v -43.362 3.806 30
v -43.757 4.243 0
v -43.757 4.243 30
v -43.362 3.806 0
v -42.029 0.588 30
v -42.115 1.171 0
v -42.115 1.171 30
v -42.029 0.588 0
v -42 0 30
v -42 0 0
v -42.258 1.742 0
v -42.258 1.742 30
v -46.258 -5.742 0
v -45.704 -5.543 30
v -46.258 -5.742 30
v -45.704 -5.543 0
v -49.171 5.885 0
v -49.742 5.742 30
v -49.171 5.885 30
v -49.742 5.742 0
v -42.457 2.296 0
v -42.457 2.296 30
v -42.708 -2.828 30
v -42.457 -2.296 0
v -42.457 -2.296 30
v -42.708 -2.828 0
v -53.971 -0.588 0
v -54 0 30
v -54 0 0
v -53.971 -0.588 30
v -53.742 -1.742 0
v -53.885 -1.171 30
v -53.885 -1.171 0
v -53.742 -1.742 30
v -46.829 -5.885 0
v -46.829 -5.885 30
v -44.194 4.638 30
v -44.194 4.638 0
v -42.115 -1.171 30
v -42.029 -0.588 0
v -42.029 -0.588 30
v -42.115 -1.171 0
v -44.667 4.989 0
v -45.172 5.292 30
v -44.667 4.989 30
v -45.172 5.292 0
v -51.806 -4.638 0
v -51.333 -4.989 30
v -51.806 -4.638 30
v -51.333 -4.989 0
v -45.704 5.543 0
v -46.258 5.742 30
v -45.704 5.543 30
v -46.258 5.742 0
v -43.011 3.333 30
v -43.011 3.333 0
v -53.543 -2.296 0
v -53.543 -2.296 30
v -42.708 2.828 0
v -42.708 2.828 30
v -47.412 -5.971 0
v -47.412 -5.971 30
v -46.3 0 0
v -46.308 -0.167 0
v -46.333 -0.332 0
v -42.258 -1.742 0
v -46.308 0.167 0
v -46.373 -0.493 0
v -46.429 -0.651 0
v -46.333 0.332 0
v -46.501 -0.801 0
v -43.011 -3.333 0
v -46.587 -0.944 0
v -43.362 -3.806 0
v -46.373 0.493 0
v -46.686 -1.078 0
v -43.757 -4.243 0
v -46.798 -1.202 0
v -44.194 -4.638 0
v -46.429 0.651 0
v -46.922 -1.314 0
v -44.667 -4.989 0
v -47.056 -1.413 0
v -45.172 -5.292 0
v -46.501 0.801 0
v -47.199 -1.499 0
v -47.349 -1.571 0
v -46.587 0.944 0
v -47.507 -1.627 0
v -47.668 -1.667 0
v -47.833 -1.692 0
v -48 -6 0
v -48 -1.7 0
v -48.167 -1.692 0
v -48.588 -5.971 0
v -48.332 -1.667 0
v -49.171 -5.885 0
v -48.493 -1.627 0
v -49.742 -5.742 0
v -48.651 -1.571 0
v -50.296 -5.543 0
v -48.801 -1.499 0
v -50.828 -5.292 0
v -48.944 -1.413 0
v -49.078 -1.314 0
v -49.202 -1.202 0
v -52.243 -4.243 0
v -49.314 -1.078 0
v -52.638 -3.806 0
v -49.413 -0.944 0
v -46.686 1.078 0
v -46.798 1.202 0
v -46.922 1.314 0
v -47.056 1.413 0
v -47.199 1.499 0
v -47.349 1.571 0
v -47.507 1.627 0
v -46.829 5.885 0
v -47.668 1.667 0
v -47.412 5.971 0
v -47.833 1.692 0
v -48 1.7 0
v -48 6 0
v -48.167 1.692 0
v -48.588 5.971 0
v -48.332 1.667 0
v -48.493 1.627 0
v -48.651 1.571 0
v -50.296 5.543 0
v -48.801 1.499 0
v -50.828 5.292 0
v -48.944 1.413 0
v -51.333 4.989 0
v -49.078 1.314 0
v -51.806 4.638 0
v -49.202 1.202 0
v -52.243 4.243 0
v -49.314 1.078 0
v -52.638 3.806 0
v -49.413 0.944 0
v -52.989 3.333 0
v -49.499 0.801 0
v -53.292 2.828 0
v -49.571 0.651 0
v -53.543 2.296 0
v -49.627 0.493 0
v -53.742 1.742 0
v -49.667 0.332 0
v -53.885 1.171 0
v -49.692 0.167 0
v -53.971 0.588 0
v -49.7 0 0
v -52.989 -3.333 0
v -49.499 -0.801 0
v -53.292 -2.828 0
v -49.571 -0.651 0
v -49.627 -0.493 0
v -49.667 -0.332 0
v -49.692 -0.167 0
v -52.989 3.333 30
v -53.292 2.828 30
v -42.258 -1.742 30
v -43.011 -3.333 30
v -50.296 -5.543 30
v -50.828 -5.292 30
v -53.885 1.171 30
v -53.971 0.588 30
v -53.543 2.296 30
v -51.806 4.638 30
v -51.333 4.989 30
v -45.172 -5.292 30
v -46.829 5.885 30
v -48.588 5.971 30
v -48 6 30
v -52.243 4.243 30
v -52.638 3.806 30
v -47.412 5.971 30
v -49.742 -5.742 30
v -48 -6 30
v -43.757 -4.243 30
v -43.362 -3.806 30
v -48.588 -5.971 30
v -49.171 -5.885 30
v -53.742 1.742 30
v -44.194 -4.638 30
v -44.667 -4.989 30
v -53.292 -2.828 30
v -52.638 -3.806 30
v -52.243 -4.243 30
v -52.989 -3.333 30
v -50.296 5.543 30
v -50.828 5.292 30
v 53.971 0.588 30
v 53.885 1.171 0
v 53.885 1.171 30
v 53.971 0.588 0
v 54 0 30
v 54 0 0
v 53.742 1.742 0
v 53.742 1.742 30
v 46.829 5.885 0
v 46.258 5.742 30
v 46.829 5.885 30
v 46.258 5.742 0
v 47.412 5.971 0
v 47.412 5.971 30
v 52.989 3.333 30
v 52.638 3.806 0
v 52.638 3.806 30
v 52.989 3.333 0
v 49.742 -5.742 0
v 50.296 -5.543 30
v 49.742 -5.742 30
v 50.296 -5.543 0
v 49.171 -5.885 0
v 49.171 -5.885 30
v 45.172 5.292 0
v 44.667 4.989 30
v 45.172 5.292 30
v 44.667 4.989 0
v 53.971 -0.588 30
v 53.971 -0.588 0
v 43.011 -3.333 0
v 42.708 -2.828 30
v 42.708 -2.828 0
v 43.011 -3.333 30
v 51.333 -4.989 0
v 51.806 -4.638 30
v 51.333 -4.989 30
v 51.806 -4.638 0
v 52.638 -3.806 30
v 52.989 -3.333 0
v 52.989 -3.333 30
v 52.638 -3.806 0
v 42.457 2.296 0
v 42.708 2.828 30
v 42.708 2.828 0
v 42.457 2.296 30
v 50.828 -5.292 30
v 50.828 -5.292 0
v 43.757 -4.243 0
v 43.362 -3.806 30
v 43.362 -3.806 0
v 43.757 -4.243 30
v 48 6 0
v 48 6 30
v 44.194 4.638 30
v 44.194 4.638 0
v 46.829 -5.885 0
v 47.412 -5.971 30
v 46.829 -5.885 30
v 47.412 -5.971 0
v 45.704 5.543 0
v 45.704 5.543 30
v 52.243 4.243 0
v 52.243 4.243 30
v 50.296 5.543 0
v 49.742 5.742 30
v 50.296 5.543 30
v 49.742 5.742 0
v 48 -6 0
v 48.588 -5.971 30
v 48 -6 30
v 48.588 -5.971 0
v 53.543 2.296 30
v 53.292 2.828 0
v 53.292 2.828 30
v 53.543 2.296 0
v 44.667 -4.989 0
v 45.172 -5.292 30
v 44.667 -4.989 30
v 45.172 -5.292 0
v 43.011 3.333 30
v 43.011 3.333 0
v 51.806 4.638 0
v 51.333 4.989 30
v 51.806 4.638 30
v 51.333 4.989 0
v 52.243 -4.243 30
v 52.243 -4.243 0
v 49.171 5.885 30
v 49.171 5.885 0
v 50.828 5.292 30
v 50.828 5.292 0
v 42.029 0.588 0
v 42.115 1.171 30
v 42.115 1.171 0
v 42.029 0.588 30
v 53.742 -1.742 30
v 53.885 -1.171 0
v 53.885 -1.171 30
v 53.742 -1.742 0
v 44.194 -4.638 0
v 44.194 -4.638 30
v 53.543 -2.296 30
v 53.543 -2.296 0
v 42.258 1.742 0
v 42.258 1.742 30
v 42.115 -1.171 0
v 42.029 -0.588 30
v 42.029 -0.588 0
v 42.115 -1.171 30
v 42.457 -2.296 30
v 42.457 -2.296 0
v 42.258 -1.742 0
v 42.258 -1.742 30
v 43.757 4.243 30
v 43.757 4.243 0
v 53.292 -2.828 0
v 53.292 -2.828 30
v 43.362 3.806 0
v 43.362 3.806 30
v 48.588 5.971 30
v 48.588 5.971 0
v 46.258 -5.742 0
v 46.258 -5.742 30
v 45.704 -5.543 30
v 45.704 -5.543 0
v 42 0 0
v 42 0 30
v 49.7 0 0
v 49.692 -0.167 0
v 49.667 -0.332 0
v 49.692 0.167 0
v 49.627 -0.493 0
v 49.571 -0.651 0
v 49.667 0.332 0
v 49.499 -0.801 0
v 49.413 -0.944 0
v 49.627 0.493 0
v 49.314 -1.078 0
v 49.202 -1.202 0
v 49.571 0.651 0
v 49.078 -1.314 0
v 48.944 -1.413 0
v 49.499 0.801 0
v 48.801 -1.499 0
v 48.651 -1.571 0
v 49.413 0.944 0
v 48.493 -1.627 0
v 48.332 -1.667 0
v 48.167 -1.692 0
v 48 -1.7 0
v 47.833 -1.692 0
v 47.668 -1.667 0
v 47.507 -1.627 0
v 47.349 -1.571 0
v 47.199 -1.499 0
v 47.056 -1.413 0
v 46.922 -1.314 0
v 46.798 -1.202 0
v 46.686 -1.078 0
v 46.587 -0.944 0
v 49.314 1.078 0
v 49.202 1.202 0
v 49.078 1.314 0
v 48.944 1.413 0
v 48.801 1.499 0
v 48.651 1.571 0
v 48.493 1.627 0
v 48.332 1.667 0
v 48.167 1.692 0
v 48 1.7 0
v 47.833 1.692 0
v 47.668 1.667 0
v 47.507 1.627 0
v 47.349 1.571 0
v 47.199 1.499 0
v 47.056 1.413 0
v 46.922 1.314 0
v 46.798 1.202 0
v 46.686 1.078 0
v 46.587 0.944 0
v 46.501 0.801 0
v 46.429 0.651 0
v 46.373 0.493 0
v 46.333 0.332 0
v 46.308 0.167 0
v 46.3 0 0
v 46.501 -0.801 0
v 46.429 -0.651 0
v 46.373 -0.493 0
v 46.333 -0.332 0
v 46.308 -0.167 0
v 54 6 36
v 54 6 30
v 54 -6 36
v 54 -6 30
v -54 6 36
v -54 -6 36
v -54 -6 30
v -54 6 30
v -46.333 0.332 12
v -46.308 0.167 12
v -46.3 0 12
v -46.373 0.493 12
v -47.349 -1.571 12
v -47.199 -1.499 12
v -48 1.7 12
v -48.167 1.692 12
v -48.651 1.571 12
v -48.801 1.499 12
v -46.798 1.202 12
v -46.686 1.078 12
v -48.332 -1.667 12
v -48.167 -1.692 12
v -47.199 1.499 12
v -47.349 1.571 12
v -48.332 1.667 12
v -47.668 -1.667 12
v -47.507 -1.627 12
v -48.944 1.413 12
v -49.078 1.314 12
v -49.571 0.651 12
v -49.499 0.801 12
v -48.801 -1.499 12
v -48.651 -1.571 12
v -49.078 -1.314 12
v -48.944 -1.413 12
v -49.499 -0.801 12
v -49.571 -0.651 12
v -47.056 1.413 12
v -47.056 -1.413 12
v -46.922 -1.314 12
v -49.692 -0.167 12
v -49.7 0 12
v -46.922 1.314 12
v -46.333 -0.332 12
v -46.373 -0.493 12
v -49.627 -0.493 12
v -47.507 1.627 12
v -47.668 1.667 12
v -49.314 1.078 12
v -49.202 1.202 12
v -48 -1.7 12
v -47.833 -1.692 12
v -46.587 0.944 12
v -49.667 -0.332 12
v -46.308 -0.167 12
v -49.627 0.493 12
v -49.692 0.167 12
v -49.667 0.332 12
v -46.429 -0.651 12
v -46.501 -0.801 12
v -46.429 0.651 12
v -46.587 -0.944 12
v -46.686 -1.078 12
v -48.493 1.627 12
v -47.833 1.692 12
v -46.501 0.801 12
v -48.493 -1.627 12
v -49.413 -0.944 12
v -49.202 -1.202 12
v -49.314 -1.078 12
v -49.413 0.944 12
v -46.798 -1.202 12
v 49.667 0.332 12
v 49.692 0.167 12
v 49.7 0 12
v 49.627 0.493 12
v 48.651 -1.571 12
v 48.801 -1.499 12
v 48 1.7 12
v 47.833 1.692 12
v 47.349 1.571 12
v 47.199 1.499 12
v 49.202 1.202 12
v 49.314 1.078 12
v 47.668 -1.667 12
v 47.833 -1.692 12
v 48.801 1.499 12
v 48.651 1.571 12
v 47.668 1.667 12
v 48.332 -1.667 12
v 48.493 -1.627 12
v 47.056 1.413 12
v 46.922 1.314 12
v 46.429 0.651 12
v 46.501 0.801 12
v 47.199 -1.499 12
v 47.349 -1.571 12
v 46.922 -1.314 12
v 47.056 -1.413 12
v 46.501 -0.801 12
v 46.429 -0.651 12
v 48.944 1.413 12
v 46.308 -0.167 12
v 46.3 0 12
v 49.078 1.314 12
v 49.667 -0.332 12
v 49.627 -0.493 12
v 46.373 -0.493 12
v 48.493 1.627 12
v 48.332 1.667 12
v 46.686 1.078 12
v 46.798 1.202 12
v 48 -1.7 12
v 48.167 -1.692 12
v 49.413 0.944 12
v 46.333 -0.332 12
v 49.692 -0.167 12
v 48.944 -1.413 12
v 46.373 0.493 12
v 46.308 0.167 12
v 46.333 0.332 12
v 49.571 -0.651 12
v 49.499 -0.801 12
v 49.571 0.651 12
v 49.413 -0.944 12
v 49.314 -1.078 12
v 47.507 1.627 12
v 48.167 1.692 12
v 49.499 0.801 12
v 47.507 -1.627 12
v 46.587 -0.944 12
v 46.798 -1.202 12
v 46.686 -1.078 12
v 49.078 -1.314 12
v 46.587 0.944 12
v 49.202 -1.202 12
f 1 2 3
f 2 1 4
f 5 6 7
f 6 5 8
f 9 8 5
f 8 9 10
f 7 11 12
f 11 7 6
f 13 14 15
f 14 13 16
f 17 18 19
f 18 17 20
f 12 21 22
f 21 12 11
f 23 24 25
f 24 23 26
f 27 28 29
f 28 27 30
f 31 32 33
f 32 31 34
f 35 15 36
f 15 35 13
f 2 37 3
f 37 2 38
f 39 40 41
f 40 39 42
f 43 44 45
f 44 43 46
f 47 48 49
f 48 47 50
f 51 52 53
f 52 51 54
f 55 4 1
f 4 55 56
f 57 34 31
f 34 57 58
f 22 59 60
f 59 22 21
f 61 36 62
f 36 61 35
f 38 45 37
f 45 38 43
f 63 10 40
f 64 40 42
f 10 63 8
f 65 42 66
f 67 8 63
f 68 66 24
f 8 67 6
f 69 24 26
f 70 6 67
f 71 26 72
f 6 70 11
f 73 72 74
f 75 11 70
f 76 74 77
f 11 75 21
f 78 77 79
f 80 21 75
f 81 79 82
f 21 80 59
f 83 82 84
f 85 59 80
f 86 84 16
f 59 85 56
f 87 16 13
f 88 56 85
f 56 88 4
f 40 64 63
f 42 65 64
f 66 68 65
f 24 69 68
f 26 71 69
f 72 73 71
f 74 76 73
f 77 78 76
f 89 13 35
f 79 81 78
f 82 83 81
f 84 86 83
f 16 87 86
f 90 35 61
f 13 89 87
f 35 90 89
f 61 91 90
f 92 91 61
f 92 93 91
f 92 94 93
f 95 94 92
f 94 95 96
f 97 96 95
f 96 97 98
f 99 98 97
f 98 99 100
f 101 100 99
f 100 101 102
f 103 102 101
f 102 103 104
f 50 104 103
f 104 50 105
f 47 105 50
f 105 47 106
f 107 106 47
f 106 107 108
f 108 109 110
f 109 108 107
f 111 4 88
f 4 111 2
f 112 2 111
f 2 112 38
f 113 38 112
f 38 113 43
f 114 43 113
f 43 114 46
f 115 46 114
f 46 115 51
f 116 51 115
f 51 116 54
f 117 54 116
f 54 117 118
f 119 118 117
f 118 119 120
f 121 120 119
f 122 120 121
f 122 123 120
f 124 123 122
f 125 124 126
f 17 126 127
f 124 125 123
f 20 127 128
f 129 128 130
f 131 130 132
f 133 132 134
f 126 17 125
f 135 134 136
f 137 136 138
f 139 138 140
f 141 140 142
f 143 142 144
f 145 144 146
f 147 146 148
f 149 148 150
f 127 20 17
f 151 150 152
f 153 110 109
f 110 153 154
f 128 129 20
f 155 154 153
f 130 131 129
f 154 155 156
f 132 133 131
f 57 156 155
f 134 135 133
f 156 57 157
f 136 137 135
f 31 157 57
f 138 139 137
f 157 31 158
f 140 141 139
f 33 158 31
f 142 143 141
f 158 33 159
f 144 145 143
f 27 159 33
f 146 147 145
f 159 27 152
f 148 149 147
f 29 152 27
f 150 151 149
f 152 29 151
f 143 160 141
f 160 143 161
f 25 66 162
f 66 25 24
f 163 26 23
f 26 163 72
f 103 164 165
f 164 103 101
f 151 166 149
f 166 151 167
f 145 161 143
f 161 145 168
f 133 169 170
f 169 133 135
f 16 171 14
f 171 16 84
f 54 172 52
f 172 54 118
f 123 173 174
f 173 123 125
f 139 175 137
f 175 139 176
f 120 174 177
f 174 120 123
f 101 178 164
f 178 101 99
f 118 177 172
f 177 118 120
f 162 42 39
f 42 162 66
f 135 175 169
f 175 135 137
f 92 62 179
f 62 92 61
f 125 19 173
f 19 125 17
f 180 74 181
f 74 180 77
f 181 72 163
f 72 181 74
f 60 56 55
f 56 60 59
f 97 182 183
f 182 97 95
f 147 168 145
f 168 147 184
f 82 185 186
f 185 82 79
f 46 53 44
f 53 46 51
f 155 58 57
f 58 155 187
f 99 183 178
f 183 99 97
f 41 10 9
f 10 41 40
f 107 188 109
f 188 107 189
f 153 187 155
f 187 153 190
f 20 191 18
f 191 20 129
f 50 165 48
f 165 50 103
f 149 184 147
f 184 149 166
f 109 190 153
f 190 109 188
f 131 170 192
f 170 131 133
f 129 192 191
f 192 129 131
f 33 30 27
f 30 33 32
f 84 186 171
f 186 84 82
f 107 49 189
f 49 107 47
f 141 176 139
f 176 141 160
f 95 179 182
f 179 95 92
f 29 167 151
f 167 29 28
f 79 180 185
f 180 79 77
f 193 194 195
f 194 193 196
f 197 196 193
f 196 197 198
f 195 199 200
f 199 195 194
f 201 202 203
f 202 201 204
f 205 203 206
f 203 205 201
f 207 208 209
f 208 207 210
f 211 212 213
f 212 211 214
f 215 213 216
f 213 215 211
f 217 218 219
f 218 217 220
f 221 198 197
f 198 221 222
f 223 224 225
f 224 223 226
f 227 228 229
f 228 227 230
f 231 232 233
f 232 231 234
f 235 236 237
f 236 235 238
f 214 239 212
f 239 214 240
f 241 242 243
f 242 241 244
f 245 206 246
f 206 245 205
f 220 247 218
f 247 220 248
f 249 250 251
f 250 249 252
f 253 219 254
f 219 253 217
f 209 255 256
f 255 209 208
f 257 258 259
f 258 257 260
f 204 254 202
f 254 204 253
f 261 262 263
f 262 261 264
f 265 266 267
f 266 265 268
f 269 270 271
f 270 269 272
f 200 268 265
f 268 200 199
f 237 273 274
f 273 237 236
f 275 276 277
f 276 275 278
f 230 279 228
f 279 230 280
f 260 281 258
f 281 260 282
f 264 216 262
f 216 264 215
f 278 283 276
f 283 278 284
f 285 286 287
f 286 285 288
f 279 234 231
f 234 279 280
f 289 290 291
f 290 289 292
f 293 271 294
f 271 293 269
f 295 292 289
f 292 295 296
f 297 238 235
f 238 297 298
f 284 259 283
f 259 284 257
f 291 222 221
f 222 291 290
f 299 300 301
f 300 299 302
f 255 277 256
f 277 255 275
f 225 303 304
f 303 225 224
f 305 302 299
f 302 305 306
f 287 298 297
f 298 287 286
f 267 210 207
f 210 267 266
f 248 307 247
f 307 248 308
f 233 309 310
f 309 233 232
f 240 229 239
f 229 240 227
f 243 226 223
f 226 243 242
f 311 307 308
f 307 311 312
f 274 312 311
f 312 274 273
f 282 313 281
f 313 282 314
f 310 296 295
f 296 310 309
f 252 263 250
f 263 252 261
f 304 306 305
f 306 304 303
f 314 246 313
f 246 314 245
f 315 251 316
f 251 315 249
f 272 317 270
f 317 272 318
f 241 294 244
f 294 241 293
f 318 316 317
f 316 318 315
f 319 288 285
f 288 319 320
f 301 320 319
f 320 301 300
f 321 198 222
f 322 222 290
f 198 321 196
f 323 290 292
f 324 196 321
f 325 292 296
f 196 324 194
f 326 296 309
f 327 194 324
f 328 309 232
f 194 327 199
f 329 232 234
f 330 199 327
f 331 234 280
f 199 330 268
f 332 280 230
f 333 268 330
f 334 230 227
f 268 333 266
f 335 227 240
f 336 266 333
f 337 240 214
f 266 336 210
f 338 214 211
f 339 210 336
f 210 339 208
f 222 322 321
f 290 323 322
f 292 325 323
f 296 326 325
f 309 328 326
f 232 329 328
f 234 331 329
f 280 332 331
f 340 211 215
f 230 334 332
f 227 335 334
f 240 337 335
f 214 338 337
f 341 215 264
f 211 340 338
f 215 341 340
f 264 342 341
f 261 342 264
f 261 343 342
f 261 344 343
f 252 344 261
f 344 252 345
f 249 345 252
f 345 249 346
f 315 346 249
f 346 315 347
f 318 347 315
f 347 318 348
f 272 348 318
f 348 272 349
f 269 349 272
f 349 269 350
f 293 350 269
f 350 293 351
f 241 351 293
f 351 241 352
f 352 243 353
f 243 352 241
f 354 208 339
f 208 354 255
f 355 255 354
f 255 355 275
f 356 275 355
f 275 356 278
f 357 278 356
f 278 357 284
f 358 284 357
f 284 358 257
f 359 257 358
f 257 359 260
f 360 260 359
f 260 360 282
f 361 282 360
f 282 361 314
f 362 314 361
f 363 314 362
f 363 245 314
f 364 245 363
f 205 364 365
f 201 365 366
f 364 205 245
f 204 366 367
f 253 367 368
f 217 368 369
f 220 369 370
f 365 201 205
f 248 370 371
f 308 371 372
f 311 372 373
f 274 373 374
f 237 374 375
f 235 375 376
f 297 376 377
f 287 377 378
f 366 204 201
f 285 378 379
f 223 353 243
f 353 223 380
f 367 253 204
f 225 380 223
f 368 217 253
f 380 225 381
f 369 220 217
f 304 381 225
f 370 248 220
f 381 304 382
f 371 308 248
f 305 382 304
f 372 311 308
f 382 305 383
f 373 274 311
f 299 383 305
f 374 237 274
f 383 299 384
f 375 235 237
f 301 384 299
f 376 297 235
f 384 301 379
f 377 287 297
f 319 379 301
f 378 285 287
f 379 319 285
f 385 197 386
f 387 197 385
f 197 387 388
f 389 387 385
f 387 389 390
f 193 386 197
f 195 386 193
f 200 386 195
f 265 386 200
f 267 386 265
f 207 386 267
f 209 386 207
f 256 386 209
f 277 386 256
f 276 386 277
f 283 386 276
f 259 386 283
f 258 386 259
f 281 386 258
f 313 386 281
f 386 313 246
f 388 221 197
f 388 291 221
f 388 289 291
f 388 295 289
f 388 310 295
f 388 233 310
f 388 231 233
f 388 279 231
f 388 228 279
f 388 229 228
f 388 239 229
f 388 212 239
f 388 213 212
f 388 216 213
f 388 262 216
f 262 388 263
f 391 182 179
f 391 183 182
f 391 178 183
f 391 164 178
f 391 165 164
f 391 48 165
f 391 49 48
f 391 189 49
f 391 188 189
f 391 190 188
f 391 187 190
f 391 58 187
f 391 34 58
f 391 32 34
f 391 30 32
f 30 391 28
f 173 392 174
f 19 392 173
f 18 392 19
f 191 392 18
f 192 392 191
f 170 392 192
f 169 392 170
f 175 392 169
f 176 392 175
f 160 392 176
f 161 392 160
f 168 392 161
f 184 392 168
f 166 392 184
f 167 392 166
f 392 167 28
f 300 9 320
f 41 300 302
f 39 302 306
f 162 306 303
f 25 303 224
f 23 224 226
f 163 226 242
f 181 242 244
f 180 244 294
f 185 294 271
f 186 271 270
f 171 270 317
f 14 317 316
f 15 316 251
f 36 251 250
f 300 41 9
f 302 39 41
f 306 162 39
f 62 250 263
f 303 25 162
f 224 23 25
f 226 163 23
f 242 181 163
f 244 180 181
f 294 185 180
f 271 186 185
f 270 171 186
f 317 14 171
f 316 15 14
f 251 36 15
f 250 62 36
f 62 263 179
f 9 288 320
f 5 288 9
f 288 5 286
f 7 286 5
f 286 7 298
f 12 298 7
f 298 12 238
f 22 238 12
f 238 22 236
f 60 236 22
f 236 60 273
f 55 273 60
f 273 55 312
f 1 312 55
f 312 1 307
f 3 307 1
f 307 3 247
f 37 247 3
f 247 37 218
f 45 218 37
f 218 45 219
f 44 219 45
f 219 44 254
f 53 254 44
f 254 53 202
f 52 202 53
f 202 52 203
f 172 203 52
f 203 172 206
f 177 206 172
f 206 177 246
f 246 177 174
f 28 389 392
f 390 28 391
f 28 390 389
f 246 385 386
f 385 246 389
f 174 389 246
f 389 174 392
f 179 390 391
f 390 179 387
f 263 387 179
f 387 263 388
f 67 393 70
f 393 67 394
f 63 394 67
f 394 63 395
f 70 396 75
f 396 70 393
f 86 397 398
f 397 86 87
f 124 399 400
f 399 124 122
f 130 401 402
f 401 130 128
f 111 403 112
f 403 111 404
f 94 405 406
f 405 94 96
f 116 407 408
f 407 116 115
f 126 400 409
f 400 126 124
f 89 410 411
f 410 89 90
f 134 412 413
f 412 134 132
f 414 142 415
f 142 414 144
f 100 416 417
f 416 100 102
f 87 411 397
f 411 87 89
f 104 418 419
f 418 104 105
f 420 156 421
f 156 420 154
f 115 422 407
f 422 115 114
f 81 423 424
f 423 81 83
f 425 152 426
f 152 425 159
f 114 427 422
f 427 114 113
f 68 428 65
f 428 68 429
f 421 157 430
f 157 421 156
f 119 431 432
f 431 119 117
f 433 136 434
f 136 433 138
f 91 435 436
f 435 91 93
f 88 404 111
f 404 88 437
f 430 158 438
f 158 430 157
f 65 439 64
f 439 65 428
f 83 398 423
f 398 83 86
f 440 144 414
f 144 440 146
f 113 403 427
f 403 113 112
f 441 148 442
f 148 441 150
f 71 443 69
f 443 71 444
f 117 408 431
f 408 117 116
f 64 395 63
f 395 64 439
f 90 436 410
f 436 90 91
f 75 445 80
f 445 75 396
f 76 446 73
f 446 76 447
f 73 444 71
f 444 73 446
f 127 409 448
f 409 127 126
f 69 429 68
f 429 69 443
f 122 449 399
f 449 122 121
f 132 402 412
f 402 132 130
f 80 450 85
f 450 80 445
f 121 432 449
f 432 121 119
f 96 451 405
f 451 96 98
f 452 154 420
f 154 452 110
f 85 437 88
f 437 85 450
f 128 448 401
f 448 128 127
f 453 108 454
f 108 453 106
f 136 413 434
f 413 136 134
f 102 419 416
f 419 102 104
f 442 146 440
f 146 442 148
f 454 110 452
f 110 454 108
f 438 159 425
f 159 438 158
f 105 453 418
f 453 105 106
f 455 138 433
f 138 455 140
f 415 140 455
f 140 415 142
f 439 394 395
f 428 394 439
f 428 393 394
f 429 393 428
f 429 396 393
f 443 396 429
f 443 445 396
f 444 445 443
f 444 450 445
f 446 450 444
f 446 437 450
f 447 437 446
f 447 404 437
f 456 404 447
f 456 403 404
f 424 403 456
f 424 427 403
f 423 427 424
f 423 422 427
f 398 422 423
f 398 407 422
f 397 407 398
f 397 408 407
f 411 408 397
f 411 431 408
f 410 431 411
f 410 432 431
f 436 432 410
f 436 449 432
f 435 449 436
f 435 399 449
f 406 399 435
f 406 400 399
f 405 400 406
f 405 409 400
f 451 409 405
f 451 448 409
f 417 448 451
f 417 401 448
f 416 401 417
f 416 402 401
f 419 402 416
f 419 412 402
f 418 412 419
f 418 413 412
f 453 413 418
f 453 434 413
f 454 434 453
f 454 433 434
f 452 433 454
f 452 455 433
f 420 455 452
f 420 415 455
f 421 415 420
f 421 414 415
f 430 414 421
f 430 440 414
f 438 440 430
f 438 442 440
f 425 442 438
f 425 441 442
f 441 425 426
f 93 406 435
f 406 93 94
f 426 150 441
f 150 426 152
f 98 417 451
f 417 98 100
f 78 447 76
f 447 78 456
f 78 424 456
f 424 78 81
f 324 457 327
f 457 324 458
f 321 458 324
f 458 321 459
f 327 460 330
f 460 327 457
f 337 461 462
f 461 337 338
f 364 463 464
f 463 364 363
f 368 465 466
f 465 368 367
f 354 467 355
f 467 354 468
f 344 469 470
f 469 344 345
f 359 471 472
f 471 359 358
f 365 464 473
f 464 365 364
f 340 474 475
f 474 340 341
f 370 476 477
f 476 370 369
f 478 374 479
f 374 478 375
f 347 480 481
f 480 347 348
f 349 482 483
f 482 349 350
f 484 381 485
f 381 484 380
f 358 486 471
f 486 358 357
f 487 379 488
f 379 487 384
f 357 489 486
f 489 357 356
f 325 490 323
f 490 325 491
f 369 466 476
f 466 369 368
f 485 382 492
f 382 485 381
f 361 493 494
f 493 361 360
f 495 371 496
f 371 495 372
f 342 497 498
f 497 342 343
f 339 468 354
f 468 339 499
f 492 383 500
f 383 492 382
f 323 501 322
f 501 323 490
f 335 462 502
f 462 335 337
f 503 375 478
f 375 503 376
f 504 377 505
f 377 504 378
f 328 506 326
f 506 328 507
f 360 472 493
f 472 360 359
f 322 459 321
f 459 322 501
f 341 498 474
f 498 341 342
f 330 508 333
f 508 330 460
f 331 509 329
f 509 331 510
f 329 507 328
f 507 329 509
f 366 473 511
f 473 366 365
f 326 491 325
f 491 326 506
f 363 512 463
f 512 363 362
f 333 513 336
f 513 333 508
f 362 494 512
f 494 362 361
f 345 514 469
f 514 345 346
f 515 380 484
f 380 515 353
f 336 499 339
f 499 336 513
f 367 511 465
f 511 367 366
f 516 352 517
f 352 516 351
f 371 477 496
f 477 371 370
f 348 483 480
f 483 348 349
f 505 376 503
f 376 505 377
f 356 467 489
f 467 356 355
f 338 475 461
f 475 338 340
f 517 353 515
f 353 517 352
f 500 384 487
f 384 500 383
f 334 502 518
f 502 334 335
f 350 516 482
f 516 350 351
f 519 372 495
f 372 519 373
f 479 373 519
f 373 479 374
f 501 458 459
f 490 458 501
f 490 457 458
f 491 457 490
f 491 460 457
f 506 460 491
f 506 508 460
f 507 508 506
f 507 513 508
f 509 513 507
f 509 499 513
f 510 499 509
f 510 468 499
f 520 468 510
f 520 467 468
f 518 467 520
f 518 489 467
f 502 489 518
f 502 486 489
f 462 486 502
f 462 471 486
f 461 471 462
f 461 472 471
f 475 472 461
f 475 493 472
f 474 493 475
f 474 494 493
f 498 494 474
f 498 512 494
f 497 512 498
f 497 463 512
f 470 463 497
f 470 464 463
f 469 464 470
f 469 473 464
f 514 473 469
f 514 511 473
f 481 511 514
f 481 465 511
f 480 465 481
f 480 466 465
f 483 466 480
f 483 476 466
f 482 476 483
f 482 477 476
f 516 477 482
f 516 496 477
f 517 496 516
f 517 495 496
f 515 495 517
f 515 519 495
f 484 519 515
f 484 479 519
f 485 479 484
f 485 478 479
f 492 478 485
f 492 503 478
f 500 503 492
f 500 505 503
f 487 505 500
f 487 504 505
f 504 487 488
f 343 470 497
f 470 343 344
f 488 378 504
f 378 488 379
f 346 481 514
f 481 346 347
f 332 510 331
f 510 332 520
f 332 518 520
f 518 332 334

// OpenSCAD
// Cabinet door pull handle
// Print orientation: posts standing on the bed (z = 0), bar on top.

$fn = 64;

// ---- Posts ----
post_d       = 12;    // post diameter
post_h       = 30;    // post height (z = 0 to 30)
post_x       = 48;    // post axis offset from origin in X (at +/-48)

// ---- Bar ----
bar_l        = 108;   // bar length (X)
bar_w        = 12;    // bar width (Y)
bar_t        = 6;     // bar thickness (z = 30 to 36)

// ---- Screw holes ----
hole_d       = 3.4;   // screw hole diameter
hole_depth   = 12;    // screw hole depth from bottom face

eps          = 0.5;   // overlap / overcut allowance

difference() {
    union() {
        // Posts (extend slightly into the bar for a solid union)
        for (sx = [-1, 1])
            translate([sx * post_x, 0, 0])
                cylinder(d = post_d, h = post_h + eps);

        // Bar
        translate([-bar_l / 2, -bar_w / 2, post_h])
            cube([bar_l, bar_w, bar_t]);
    }

    // Screw holes up each post axis from the bottom face
    for (sx = [-1, 1])
        translate([sx * post_x, 0, -eps])
            cylinder(d = hole_d, h = hole_depth + eps);
}
